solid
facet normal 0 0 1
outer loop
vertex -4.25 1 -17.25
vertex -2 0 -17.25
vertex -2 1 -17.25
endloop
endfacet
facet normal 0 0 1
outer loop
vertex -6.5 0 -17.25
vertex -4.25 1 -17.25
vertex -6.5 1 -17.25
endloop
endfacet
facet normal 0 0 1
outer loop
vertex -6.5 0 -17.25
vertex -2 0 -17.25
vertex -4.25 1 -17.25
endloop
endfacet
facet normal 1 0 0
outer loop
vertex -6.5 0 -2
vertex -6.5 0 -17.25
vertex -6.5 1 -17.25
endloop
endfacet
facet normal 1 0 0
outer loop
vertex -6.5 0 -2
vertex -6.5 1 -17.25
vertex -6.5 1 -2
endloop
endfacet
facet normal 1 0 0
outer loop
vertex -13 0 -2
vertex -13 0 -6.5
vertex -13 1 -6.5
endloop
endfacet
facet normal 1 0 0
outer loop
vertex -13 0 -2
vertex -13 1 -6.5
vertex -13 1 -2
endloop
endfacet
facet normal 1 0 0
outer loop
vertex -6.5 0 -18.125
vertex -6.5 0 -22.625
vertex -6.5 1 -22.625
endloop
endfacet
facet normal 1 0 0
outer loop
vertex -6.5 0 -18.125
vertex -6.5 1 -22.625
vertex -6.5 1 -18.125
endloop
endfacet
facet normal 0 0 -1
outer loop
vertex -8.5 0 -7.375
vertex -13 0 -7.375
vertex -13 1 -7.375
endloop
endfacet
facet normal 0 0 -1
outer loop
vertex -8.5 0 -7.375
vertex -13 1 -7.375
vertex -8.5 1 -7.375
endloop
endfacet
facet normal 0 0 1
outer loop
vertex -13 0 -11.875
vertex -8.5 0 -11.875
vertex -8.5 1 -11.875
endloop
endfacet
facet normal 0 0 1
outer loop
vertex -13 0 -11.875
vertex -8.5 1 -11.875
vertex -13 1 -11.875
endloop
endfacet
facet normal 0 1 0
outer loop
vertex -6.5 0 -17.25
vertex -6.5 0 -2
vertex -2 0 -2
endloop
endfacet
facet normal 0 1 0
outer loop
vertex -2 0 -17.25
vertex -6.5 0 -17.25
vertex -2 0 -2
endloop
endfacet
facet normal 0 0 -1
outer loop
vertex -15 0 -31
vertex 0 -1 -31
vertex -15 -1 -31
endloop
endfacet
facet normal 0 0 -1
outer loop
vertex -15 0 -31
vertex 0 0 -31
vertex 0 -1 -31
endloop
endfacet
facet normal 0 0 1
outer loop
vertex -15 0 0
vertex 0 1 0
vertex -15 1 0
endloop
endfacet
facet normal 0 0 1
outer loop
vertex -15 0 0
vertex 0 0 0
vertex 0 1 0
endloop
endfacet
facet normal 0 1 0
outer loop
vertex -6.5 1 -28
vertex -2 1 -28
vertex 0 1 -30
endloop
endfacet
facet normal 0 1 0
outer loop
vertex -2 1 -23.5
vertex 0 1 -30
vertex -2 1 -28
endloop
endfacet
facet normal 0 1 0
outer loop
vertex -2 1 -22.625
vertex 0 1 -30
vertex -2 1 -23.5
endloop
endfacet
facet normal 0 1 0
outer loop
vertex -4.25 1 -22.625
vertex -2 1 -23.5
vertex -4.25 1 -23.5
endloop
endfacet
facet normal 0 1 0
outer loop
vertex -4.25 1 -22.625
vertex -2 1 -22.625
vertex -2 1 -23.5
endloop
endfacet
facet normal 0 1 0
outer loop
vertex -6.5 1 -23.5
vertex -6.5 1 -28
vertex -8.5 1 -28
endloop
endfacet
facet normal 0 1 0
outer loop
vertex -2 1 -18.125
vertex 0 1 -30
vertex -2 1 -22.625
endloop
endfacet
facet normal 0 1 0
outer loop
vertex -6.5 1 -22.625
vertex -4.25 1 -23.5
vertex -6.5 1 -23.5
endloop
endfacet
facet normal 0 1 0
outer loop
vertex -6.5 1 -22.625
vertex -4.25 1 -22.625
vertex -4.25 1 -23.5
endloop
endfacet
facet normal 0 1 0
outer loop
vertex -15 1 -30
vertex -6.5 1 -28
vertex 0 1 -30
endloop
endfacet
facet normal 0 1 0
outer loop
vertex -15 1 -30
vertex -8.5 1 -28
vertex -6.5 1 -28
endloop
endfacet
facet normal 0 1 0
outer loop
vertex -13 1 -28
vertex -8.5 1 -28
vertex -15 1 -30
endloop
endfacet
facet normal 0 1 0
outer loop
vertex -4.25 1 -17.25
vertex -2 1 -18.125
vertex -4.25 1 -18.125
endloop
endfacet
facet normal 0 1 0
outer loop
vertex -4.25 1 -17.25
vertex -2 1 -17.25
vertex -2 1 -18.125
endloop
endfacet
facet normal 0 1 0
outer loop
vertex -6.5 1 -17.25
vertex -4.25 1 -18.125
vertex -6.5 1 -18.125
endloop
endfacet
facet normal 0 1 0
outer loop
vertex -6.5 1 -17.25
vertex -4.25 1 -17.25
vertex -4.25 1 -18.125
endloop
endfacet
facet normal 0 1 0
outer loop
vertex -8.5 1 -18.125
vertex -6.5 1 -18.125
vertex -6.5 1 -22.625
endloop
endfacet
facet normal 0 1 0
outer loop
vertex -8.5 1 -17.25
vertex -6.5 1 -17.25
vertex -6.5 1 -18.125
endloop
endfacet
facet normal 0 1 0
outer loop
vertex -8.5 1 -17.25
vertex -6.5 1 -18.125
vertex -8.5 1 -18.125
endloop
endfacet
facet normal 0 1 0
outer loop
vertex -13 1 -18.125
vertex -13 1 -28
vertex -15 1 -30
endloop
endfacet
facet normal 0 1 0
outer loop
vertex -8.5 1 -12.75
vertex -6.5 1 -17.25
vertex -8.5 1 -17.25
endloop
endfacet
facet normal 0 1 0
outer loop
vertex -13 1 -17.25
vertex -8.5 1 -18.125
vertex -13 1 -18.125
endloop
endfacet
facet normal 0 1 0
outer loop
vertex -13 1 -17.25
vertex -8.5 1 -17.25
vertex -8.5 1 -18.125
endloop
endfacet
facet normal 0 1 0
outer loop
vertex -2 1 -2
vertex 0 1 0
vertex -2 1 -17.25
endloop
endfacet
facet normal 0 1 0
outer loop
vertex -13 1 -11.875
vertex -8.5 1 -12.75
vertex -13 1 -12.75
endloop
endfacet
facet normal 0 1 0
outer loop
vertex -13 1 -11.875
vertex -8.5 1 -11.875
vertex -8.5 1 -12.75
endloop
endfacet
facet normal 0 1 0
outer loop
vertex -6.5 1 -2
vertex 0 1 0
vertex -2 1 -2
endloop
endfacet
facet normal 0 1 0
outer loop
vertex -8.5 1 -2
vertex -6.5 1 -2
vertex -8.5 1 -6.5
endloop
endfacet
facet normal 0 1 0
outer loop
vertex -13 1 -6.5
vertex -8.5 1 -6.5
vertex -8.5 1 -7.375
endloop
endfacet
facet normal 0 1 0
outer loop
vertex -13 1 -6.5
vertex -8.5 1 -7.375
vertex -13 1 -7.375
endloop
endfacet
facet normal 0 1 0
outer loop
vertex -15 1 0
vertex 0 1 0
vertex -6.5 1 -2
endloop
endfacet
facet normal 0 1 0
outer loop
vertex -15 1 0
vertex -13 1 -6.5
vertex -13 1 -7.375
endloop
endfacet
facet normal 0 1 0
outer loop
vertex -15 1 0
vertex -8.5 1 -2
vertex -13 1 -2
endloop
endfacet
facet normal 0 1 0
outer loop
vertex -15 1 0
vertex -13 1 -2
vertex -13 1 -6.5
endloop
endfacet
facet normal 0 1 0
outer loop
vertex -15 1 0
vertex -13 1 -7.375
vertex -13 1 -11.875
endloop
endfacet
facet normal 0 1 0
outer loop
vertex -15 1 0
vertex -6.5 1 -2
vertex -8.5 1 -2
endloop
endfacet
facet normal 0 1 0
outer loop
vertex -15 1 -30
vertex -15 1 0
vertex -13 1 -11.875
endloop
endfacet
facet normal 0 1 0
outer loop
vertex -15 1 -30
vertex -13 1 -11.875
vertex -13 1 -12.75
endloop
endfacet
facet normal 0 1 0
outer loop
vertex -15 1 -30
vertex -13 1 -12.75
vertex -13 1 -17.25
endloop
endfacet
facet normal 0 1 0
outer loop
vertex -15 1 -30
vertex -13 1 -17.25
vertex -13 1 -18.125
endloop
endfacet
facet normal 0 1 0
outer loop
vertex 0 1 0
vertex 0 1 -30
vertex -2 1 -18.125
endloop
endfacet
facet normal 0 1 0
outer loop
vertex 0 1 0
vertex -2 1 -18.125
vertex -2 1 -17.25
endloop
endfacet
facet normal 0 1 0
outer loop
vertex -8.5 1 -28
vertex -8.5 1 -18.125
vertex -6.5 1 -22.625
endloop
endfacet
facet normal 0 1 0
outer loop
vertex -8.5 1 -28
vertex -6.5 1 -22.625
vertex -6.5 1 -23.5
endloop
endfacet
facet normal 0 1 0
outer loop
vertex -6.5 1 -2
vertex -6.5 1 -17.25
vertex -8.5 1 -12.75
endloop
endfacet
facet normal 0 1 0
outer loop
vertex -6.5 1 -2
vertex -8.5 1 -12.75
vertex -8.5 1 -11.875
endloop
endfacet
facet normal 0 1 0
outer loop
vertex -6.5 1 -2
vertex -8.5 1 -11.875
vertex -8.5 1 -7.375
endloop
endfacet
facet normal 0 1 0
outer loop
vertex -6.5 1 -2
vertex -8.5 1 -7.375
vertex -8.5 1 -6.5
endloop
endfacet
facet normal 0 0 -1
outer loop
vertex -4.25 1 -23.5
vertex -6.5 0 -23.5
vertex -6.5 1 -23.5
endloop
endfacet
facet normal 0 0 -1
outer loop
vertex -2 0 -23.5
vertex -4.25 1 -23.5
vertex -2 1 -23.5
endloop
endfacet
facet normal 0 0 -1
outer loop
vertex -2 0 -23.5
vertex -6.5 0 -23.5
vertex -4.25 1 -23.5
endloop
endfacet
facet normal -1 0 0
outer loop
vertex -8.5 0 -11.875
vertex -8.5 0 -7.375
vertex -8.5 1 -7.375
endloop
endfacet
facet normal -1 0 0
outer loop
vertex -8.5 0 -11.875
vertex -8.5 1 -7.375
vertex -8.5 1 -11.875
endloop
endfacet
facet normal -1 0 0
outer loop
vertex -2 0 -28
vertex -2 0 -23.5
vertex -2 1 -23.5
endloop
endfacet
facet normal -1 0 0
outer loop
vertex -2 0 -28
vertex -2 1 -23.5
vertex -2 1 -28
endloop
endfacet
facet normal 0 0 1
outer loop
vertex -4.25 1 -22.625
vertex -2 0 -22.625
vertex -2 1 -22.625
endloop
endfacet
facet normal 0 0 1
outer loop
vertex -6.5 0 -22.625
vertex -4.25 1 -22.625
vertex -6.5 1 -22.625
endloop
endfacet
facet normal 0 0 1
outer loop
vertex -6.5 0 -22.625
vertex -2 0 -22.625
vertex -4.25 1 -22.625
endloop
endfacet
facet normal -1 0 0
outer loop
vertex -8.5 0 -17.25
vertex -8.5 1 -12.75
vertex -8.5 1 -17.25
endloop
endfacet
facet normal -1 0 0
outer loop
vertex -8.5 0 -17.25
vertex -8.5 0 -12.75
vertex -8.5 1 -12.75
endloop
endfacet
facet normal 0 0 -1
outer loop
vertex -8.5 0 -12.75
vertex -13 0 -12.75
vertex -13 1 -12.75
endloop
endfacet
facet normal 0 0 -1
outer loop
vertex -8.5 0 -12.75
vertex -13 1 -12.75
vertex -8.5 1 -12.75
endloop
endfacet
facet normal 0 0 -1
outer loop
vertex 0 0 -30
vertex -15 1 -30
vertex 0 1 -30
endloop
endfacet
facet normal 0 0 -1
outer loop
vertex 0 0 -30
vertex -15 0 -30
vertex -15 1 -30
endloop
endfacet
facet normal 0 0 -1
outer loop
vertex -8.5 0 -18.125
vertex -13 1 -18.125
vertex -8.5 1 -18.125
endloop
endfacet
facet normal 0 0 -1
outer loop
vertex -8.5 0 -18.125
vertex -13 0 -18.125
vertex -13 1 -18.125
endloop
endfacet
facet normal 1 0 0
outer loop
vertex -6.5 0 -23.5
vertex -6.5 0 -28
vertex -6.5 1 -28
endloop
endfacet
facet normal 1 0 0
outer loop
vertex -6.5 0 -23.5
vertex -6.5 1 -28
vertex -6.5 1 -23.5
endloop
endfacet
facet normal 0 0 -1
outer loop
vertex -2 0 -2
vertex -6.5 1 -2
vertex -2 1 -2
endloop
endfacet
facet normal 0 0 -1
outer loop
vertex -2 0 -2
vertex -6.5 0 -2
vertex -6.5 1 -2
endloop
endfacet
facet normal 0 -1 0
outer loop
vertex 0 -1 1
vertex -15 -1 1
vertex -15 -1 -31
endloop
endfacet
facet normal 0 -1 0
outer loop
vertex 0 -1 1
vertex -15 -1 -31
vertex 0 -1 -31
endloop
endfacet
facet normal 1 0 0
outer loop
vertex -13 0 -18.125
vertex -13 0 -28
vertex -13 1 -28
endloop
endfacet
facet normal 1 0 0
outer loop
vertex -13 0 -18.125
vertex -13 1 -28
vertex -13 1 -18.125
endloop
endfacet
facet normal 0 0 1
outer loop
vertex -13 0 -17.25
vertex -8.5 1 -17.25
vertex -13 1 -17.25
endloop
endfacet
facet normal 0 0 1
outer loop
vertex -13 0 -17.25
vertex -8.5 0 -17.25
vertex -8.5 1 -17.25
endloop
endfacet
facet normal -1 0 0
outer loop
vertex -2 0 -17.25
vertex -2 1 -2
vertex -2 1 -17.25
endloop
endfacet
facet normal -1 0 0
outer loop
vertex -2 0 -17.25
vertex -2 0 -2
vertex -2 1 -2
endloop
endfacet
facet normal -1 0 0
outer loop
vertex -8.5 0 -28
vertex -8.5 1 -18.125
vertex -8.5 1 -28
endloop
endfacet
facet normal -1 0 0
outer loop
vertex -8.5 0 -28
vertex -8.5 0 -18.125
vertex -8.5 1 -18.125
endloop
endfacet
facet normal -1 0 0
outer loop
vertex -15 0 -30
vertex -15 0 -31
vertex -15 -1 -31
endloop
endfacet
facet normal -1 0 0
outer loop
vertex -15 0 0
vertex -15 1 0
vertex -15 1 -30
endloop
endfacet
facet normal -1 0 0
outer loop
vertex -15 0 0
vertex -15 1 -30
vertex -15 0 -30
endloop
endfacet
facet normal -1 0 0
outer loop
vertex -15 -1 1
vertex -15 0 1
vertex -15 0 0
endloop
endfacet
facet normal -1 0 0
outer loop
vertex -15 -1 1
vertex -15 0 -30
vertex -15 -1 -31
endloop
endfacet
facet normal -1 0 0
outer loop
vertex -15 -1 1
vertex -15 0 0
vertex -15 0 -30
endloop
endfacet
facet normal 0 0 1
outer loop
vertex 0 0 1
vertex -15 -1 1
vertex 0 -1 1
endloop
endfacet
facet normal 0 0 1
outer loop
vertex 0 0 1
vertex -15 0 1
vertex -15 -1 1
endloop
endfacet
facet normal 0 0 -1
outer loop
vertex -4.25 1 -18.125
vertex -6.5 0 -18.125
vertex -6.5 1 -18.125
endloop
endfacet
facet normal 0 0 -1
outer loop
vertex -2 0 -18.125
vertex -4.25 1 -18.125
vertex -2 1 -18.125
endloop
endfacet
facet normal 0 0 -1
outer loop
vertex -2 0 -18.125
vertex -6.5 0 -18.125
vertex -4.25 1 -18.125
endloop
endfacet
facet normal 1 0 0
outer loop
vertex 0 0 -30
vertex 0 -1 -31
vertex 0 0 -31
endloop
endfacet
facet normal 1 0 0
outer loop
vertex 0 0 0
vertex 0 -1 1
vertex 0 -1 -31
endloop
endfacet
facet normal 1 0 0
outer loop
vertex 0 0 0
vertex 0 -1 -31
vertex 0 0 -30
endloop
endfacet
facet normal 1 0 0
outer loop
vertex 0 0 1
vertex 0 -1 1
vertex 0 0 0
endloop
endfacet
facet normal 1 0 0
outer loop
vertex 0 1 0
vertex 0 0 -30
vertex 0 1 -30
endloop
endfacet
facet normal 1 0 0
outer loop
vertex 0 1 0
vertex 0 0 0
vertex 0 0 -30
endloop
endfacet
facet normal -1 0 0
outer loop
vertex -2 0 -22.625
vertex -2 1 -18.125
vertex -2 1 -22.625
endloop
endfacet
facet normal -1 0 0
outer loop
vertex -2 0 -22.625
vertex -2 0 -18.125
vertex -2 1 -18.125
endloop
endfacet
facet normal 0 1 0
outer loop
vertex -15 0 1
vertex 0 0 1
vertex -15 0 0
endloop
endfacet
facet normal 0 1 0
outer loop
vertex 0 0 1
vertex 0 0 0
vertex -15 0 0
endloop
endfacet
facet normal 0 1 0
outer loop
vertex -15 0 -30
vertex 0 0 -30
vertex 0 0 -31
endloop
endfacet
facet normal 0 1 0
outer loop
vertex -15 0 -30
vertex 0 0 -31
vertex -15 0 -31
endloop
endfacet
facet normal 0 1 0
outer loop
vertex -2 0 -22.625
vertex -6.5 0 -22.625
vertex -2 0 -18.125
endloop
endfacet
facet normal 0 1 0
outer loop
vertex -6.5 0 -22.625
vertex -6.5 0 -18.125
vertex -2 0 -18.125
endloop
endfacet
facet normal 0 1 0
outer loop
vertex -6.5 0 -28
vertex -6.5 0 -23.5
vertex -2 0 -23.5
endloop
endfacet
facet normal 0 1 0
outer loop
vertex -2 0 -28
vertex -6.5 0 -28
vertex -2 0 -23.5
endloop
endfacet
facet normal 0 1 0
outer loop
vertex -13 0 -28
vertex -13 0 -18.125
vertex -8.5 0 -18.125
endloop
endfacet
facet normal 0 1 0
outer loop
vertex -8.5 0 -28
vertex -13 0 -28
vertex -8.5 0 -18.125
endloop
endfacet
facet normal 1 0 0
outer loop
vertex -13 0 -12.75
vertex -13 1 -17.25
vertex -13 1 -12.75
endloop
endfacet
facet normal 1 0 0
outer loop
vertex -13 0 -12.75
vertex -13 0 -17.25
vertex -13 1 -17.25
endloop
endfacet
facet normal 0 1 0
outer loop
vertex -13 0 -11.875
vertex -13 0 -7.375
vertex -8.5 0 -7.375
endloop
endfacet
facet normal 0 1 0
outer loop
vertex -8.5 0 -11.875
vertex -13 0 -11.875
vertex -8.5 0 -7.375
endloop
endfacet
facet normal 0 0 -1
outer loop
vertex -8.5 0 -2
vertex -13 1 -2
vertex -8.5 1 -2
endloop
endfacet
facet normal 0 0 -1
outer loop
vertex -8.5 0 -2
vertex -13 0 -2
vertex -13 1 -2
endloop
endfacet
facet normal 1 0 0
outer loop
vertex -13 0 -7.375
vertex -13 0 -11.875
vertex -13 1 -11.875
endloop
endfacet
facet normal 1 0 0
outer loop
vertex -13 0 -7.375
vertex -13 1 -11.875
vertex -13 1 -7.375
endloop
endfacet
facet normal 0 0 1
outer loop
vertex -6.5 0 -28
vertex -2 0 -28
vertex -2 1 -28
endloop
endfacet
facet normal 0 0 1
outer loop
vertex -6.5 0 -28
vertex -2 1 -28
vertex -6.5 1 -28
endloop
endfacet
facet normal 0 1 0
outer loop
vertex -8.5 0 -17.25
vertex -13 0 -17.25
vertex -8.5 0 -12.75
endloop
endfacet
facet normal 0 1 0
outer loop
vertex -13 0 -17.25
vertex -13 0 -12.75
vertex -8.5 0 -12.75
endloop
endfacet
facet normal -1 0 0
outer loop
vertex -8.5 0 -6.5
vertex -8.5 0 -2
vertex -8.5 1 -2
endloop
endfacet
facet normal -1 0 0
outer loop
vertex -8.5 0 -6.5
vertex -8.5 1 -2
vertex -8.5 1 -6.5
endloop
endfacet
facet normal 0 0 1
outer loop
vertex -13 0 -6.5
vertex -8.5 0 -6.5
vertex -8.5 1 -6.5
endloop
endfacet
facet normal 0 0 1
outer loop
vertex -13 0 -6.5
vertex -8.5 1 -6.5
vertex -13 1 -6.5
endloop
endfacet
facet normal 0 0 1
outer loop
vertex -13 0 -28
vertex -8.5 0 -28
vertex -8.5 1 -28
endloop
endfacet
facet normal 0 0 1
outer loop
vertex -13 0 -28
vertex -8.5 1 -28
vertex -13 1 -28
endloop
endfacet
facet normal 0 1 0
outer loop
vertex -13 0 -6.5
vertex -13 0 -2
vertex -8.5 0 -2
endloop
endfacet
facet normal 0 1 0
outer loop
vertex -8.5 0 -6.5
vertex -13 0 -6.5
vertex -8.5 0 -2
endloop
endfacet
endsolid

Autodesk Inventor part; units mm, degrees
ref_plane "YZ Plane" through (0, 0, 0) normal (1, 0, 0) x (0, 1, 0)
ref_plane "XZ Plane" through (0, 0, 0) normal (0, 1, 0) x (-1, 0, 0)
ref_plane "XY Plane" through (0, 0, 0) normal (0, 0, 1) x (1, 0, 0)
sketch "Эскиз1" plane through (0, 0, 0) normal (0, 1, 0) x (-1, 0, 0)
  line L0 (0, 0) -> (15, 0)
  line L1 (15, 0) -> (15, -30)
  line L2 (15, -30) -> (0, -30)
  line L3 (0, -30) -> (0, 0)
  line L4 (13, -2) -> (8.5, -2)
  line L5 (8.5, -2) -> (8.5, -6.5)
  line L6 (8.5, -6.5) -> (13, -6.5)
  line L7 (13, -6.5) -> (13, -2)
  line L8 (13, -7.375) -> (8.5, -7.375)
  line L9 (8.5, -7.375) -> (8.5, -11.875)
  line L10 (8.5, -11.875) -> (13, -11.875)
  line L11 (13, -11.875) -> (13, -7.375)
  line L12 (13, -12.75) -> (8.5, -12.75)
  line L13 (8.5, -12.75) -> (8.5, -17.25)
  line L14 (8.5, -17.25) -> (13, -17.25)
  line L15 (13, -17.25) -> (13, -12.75)
  line L16 (13, -18.125) -> (8.5, -18.125)
  line L17 (8.5, -18.125) -> (8.5, -28)
  line L18 (8.5, -28) -> (13, -28)
  line L19 (13, -28) -> (13, -18.125)
  line L20 (6.5, -18.125) -> (2, -18.125)
  line L21 (2, -18.125) -> (2, -22.625)
  line L22 (2, -22.625) -> (6.5, -22.625)
  line L23 (6.5, -22.625) -> (6.5, -18.125)
  line L24 (6.5, -23.5) -> (2, -23.5)
  line L25 (2, -23.5) -> (2, -28)
  line L26 (2, -28) -> (6.5, -28)
  line L27 (6.5, -28) -> (6.5, -23.5)
  line L28 (6.5, -2) -> (2, -2)
  line L29 (2, -2) -> (2, -17.25)
  line L30 (2, -17.25) -> (6.5, -17.25)
  line L31 (6.5, -17.25) -> (6.5, -2)
  line L32 (10.75, -6.5) -> (10.75, -7.375)
  line L33 (10.75, -11.875) -> (10.75, -12.75)
  line L34 (10.75, -17.25) -> (10.75, -18.125)
  line L35 (4.25, -17.25) -> (4.25, -18.125)
  line L36 (4.25, -22.625) -> (4.25, -23.5)
  line L37 (10.75, -2) -> (10.75, 0)
  line L38 (10.75, -28) -> (10.75, -30)
  line L39 (13, -9.625) -> (15, -9.625)
  line L40 (2, -9.625) -> (0, -9.625)
  line L41 (8.5, -9.625) -> (6.5, -9.625)
  dimension "d0" = 15
  dimension "d1" = 30
  dimension "d9" = 2
extrude "Выдавливание1" add sketch "Эскиз1" along normal blind 1 contours L0 L37 L4 L5 L6 L32 L8 L9 L41 L31 L28 L29 L40 L3 | L0 L1 L39 L11 L8 L32 L6 L7 L4 L37 | L40 L29 L30 L31 L41 L9 L10 L33 L12 L13 L14 L34 L16 L17 L18 L38 L2 L3 | L1 L2 L38 L18 L19 L16 L34 L14 L15 L12 L33 L10 L11 L39
sketch "Эскиз2" plane through (0, 0, 0) normal (0, -1, 0) x (1, 0, 0)
  line L0 (0, 0) -> (0, -30) projected
  line L1 (-15, 0) -> (0, 0) projected
  line L2 (-15, -30) -> (-15, 0) projected
  line L3 (0, -30) -> (-15, -30) projected
  line L4 (-6.5, -17.25) -> (-2, -17.25) projected
  line L5 (-6.5, -2) -> (-6.5, -17.25) projected
  line L6 (-2, -2) -> (-6.5, -2) projected
  line L7 (-2, -17.25) -> (-2, -2) projected
  line L8 (-2, -28) -> (-2, -23.5) projected
  line L9 (-6.5, -28) -> (-2, -28) projected
  line L10 (-6.5, -23.5) -> (-6.5, -28) projected
  line L11 (-2, -23.5) -> (-6.5, -23.5) projected
  line L12 (-8.5, -12.75) -> (-13, -12.75) projected
  line L13 (-8.5, -17.25) -> (-8.5, -12.75) projected
  line L14 (-13, -17.25) -> (-8.5, -17.25) projected
  line L15 (-13, -12.75) -> (-13, -17.25) projected
  line L16 (-13, -18.125) -> (-13, -28) projected
  line L17 (-8.5, -18.125) -> (-13, -18.125) projected
  line L18 (-8.5, -28) -> (-8.5, -18.125) projected
  line L19 (-13, -28) -> (-8.5, -28) projected
  line L20 (-13, -11.875) -> (-8.5, -11.875) projected
  line L21 (-13, -7.375) -> (-13, -11.875) projected
  line L22 (-8.5, -7.375) -> (-13, -7.375) projected
  line L23 (-8.5, -11.875) -> (-8.5, -7.375) projected
  line L24 (-13, -2) -> (-13, -6.5) projected
  line L25 (-8.5, -2) -> (-13, -2) projected
  line L26 (-8.5, -6.5) -> (-8.5, -2) projected
  line L27 (-13, -6.5) -> (-8.5, -6.5) projected
  line L28 (-2, -22.625) -> (-2, -18.125) projected
  line L29 (-6.5, -22.625) -> (-2, -22.625) projected
  line L30 (-6.5, -18.125) -> (-6.5, -22.625) projected
  line L31 (-2, -18.125) -> (-6.5, -18.125) projected
extrude "Выдавливание2" add sketch "Эскиз2" along normal blind 1 contours L0 L3 L2 L1 | L5 L6 L7 L4 | L9 L10 L11 L8 | L13 L14 L15 L12 | L17 L18 L19 L16 | L21 L22 L23 L20 | L25 L26 L27 L24 | L29 L30 L31 L28
sketch "Эскиз3" plane through (-15, 1, 0) normal (0, 0, 1) x (1, 0, 0)
  line L0 (0, -2) -> (15, -2)
  line L1 (15, -2) -> (15, -1)
  line L2 (15, -1) -> (0, -1)
  line L3 (0, -1) -> (0, -2)
  line L4 (15, -2) -> (15, 0) projected
  line L5 (0, -2) -> (0, 0) projected
  line L6 (15, -2) -> (0, -2) projected
  dimension "d14" = 1
extrude "Выдавливание3" add sketch "Эскиз3" along normal blind 1
sketch "Эскиз4" plane through (0, 1, -30) normal (0, 0, -1) x (-1, 0, 0)
  line L0 (8.5, -1) -> (13, -1) projected
  line L1 (15, -2) -> (0, -2) projected
  line L2 (0, -2) -> (0, -1) projected
  line L3 (0, -1) -> (15, -1) projected
  line L4 (15, -1) -> (15, -2) projected
extrude "Выдавливание4" add sketch "Эскиз4" along normal blind 1
properties part number "Лого ШП"
